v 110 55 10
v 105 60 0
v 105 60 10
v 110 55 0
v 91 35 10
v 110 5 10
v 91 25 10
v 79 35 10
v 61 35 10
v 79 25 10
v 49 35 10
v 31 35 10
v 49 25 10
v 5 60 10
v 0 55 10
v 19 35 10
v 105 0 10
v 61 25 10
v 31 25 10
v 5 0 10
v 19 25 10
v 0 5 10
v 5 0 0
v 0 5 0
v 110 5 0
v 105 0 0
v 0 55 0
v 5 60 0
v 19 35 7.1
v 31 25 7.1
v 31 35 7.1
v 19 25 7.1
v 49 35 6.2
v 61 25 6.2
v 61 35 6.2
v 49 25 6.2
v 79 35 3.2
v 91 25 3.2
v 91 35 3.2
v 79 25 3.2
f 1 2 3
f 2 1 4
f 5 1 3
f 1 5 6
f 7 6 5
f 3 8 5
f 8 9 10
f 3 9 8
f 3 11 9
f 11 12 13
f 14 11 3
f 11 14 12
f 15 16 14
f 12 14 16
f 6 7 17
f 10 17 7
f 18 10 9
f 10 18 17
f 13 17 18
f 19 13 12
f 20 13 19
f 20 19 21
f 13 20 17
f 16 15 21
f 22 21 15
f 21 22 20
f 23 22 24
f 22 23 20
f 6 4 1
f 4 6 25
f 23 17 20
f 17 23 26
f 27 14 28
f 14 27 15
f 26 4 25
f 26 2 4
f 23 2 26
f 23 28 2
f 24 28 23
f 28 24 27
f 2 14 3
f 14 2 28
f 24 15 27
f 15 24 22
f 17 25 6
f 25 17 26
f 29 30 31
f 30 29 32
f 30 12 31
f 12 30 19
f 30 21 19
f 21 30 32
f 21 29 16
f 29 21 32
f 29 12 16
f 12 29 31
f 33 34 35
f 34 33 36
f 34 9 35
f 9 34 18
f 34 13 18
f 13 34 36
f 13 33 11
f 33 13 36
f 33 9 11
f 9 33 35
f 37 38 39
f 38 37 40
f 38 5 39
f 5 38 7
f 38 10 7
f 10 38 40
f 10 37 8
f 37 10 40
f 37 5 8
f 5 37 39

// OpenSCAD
$fn = 32;

// ----------------------------------------------------------------------
// Windowed plate: 3 voids, 110 x 60 x 10 mm
// ----------------------------------------------------------------------

// --- parameters (mm) ---
plate_l = 110;            // plate length, X
plate_w = 60;             // plate width, Y
plate_t = 10;             // plate thickness, Z
edge_margin = 10;         // wall from the plate edge to any window
windows = 3;              // number of windows in the row
win_l = 12;               // window length
win_w = 10;               // window width
win_pitch = 30;           // window pitch along X
depth_1 = 2.9;            // depth of void 1 (full thickness = through)
depth_2 = 3.8;            // depth of void 2 (full thickness = through)
depth_3 = 6.8;            // depth of void 3 (full thickness = through)
corner_c = 5;             // corner chamfer of the plate
fit_tol = 0.1;            // declared fit tolerance (prompt contract)
free_tol = 0.3;           // declared free tolerance (prompt contract)

profile = [[5, 0], [105, 0], [110, 5], [110, 55], [105, 60], [5, 60], [0, 55], [0, 5]];  // primary outline, 8 points, counter clockwise
void_1 = [[19, 25], [31, 25], [31, 35], [19, 35]];  // window 1 of the row, 4 points
void_2 = [[49, 25], [61, 25], [61, 35], [49, 35]];  // window 2 of the row, 4 points
void_3 = [[79, 25], [91, 25], [91, 35], [79, 35]];  // window 3 of the row, 4 points

// --- the one profile operation ---
difference() {
  linear_extrude(height = plate_t) polygon(points = profile);
  translate([0, 0, plate_t - depth_1])
    linear_extrude(height = depth_1 + 1) polygon(points = void_1);
  translate([0, 0, plate_t - depth_2])
    linear_extrude(height = depth_2 + 1) polygon(points = void_2);
  translate([0, 0, plate_t - depth_3])
    linear_extrude(height = depth_3 + 1) polygon(points = void_3);
}
